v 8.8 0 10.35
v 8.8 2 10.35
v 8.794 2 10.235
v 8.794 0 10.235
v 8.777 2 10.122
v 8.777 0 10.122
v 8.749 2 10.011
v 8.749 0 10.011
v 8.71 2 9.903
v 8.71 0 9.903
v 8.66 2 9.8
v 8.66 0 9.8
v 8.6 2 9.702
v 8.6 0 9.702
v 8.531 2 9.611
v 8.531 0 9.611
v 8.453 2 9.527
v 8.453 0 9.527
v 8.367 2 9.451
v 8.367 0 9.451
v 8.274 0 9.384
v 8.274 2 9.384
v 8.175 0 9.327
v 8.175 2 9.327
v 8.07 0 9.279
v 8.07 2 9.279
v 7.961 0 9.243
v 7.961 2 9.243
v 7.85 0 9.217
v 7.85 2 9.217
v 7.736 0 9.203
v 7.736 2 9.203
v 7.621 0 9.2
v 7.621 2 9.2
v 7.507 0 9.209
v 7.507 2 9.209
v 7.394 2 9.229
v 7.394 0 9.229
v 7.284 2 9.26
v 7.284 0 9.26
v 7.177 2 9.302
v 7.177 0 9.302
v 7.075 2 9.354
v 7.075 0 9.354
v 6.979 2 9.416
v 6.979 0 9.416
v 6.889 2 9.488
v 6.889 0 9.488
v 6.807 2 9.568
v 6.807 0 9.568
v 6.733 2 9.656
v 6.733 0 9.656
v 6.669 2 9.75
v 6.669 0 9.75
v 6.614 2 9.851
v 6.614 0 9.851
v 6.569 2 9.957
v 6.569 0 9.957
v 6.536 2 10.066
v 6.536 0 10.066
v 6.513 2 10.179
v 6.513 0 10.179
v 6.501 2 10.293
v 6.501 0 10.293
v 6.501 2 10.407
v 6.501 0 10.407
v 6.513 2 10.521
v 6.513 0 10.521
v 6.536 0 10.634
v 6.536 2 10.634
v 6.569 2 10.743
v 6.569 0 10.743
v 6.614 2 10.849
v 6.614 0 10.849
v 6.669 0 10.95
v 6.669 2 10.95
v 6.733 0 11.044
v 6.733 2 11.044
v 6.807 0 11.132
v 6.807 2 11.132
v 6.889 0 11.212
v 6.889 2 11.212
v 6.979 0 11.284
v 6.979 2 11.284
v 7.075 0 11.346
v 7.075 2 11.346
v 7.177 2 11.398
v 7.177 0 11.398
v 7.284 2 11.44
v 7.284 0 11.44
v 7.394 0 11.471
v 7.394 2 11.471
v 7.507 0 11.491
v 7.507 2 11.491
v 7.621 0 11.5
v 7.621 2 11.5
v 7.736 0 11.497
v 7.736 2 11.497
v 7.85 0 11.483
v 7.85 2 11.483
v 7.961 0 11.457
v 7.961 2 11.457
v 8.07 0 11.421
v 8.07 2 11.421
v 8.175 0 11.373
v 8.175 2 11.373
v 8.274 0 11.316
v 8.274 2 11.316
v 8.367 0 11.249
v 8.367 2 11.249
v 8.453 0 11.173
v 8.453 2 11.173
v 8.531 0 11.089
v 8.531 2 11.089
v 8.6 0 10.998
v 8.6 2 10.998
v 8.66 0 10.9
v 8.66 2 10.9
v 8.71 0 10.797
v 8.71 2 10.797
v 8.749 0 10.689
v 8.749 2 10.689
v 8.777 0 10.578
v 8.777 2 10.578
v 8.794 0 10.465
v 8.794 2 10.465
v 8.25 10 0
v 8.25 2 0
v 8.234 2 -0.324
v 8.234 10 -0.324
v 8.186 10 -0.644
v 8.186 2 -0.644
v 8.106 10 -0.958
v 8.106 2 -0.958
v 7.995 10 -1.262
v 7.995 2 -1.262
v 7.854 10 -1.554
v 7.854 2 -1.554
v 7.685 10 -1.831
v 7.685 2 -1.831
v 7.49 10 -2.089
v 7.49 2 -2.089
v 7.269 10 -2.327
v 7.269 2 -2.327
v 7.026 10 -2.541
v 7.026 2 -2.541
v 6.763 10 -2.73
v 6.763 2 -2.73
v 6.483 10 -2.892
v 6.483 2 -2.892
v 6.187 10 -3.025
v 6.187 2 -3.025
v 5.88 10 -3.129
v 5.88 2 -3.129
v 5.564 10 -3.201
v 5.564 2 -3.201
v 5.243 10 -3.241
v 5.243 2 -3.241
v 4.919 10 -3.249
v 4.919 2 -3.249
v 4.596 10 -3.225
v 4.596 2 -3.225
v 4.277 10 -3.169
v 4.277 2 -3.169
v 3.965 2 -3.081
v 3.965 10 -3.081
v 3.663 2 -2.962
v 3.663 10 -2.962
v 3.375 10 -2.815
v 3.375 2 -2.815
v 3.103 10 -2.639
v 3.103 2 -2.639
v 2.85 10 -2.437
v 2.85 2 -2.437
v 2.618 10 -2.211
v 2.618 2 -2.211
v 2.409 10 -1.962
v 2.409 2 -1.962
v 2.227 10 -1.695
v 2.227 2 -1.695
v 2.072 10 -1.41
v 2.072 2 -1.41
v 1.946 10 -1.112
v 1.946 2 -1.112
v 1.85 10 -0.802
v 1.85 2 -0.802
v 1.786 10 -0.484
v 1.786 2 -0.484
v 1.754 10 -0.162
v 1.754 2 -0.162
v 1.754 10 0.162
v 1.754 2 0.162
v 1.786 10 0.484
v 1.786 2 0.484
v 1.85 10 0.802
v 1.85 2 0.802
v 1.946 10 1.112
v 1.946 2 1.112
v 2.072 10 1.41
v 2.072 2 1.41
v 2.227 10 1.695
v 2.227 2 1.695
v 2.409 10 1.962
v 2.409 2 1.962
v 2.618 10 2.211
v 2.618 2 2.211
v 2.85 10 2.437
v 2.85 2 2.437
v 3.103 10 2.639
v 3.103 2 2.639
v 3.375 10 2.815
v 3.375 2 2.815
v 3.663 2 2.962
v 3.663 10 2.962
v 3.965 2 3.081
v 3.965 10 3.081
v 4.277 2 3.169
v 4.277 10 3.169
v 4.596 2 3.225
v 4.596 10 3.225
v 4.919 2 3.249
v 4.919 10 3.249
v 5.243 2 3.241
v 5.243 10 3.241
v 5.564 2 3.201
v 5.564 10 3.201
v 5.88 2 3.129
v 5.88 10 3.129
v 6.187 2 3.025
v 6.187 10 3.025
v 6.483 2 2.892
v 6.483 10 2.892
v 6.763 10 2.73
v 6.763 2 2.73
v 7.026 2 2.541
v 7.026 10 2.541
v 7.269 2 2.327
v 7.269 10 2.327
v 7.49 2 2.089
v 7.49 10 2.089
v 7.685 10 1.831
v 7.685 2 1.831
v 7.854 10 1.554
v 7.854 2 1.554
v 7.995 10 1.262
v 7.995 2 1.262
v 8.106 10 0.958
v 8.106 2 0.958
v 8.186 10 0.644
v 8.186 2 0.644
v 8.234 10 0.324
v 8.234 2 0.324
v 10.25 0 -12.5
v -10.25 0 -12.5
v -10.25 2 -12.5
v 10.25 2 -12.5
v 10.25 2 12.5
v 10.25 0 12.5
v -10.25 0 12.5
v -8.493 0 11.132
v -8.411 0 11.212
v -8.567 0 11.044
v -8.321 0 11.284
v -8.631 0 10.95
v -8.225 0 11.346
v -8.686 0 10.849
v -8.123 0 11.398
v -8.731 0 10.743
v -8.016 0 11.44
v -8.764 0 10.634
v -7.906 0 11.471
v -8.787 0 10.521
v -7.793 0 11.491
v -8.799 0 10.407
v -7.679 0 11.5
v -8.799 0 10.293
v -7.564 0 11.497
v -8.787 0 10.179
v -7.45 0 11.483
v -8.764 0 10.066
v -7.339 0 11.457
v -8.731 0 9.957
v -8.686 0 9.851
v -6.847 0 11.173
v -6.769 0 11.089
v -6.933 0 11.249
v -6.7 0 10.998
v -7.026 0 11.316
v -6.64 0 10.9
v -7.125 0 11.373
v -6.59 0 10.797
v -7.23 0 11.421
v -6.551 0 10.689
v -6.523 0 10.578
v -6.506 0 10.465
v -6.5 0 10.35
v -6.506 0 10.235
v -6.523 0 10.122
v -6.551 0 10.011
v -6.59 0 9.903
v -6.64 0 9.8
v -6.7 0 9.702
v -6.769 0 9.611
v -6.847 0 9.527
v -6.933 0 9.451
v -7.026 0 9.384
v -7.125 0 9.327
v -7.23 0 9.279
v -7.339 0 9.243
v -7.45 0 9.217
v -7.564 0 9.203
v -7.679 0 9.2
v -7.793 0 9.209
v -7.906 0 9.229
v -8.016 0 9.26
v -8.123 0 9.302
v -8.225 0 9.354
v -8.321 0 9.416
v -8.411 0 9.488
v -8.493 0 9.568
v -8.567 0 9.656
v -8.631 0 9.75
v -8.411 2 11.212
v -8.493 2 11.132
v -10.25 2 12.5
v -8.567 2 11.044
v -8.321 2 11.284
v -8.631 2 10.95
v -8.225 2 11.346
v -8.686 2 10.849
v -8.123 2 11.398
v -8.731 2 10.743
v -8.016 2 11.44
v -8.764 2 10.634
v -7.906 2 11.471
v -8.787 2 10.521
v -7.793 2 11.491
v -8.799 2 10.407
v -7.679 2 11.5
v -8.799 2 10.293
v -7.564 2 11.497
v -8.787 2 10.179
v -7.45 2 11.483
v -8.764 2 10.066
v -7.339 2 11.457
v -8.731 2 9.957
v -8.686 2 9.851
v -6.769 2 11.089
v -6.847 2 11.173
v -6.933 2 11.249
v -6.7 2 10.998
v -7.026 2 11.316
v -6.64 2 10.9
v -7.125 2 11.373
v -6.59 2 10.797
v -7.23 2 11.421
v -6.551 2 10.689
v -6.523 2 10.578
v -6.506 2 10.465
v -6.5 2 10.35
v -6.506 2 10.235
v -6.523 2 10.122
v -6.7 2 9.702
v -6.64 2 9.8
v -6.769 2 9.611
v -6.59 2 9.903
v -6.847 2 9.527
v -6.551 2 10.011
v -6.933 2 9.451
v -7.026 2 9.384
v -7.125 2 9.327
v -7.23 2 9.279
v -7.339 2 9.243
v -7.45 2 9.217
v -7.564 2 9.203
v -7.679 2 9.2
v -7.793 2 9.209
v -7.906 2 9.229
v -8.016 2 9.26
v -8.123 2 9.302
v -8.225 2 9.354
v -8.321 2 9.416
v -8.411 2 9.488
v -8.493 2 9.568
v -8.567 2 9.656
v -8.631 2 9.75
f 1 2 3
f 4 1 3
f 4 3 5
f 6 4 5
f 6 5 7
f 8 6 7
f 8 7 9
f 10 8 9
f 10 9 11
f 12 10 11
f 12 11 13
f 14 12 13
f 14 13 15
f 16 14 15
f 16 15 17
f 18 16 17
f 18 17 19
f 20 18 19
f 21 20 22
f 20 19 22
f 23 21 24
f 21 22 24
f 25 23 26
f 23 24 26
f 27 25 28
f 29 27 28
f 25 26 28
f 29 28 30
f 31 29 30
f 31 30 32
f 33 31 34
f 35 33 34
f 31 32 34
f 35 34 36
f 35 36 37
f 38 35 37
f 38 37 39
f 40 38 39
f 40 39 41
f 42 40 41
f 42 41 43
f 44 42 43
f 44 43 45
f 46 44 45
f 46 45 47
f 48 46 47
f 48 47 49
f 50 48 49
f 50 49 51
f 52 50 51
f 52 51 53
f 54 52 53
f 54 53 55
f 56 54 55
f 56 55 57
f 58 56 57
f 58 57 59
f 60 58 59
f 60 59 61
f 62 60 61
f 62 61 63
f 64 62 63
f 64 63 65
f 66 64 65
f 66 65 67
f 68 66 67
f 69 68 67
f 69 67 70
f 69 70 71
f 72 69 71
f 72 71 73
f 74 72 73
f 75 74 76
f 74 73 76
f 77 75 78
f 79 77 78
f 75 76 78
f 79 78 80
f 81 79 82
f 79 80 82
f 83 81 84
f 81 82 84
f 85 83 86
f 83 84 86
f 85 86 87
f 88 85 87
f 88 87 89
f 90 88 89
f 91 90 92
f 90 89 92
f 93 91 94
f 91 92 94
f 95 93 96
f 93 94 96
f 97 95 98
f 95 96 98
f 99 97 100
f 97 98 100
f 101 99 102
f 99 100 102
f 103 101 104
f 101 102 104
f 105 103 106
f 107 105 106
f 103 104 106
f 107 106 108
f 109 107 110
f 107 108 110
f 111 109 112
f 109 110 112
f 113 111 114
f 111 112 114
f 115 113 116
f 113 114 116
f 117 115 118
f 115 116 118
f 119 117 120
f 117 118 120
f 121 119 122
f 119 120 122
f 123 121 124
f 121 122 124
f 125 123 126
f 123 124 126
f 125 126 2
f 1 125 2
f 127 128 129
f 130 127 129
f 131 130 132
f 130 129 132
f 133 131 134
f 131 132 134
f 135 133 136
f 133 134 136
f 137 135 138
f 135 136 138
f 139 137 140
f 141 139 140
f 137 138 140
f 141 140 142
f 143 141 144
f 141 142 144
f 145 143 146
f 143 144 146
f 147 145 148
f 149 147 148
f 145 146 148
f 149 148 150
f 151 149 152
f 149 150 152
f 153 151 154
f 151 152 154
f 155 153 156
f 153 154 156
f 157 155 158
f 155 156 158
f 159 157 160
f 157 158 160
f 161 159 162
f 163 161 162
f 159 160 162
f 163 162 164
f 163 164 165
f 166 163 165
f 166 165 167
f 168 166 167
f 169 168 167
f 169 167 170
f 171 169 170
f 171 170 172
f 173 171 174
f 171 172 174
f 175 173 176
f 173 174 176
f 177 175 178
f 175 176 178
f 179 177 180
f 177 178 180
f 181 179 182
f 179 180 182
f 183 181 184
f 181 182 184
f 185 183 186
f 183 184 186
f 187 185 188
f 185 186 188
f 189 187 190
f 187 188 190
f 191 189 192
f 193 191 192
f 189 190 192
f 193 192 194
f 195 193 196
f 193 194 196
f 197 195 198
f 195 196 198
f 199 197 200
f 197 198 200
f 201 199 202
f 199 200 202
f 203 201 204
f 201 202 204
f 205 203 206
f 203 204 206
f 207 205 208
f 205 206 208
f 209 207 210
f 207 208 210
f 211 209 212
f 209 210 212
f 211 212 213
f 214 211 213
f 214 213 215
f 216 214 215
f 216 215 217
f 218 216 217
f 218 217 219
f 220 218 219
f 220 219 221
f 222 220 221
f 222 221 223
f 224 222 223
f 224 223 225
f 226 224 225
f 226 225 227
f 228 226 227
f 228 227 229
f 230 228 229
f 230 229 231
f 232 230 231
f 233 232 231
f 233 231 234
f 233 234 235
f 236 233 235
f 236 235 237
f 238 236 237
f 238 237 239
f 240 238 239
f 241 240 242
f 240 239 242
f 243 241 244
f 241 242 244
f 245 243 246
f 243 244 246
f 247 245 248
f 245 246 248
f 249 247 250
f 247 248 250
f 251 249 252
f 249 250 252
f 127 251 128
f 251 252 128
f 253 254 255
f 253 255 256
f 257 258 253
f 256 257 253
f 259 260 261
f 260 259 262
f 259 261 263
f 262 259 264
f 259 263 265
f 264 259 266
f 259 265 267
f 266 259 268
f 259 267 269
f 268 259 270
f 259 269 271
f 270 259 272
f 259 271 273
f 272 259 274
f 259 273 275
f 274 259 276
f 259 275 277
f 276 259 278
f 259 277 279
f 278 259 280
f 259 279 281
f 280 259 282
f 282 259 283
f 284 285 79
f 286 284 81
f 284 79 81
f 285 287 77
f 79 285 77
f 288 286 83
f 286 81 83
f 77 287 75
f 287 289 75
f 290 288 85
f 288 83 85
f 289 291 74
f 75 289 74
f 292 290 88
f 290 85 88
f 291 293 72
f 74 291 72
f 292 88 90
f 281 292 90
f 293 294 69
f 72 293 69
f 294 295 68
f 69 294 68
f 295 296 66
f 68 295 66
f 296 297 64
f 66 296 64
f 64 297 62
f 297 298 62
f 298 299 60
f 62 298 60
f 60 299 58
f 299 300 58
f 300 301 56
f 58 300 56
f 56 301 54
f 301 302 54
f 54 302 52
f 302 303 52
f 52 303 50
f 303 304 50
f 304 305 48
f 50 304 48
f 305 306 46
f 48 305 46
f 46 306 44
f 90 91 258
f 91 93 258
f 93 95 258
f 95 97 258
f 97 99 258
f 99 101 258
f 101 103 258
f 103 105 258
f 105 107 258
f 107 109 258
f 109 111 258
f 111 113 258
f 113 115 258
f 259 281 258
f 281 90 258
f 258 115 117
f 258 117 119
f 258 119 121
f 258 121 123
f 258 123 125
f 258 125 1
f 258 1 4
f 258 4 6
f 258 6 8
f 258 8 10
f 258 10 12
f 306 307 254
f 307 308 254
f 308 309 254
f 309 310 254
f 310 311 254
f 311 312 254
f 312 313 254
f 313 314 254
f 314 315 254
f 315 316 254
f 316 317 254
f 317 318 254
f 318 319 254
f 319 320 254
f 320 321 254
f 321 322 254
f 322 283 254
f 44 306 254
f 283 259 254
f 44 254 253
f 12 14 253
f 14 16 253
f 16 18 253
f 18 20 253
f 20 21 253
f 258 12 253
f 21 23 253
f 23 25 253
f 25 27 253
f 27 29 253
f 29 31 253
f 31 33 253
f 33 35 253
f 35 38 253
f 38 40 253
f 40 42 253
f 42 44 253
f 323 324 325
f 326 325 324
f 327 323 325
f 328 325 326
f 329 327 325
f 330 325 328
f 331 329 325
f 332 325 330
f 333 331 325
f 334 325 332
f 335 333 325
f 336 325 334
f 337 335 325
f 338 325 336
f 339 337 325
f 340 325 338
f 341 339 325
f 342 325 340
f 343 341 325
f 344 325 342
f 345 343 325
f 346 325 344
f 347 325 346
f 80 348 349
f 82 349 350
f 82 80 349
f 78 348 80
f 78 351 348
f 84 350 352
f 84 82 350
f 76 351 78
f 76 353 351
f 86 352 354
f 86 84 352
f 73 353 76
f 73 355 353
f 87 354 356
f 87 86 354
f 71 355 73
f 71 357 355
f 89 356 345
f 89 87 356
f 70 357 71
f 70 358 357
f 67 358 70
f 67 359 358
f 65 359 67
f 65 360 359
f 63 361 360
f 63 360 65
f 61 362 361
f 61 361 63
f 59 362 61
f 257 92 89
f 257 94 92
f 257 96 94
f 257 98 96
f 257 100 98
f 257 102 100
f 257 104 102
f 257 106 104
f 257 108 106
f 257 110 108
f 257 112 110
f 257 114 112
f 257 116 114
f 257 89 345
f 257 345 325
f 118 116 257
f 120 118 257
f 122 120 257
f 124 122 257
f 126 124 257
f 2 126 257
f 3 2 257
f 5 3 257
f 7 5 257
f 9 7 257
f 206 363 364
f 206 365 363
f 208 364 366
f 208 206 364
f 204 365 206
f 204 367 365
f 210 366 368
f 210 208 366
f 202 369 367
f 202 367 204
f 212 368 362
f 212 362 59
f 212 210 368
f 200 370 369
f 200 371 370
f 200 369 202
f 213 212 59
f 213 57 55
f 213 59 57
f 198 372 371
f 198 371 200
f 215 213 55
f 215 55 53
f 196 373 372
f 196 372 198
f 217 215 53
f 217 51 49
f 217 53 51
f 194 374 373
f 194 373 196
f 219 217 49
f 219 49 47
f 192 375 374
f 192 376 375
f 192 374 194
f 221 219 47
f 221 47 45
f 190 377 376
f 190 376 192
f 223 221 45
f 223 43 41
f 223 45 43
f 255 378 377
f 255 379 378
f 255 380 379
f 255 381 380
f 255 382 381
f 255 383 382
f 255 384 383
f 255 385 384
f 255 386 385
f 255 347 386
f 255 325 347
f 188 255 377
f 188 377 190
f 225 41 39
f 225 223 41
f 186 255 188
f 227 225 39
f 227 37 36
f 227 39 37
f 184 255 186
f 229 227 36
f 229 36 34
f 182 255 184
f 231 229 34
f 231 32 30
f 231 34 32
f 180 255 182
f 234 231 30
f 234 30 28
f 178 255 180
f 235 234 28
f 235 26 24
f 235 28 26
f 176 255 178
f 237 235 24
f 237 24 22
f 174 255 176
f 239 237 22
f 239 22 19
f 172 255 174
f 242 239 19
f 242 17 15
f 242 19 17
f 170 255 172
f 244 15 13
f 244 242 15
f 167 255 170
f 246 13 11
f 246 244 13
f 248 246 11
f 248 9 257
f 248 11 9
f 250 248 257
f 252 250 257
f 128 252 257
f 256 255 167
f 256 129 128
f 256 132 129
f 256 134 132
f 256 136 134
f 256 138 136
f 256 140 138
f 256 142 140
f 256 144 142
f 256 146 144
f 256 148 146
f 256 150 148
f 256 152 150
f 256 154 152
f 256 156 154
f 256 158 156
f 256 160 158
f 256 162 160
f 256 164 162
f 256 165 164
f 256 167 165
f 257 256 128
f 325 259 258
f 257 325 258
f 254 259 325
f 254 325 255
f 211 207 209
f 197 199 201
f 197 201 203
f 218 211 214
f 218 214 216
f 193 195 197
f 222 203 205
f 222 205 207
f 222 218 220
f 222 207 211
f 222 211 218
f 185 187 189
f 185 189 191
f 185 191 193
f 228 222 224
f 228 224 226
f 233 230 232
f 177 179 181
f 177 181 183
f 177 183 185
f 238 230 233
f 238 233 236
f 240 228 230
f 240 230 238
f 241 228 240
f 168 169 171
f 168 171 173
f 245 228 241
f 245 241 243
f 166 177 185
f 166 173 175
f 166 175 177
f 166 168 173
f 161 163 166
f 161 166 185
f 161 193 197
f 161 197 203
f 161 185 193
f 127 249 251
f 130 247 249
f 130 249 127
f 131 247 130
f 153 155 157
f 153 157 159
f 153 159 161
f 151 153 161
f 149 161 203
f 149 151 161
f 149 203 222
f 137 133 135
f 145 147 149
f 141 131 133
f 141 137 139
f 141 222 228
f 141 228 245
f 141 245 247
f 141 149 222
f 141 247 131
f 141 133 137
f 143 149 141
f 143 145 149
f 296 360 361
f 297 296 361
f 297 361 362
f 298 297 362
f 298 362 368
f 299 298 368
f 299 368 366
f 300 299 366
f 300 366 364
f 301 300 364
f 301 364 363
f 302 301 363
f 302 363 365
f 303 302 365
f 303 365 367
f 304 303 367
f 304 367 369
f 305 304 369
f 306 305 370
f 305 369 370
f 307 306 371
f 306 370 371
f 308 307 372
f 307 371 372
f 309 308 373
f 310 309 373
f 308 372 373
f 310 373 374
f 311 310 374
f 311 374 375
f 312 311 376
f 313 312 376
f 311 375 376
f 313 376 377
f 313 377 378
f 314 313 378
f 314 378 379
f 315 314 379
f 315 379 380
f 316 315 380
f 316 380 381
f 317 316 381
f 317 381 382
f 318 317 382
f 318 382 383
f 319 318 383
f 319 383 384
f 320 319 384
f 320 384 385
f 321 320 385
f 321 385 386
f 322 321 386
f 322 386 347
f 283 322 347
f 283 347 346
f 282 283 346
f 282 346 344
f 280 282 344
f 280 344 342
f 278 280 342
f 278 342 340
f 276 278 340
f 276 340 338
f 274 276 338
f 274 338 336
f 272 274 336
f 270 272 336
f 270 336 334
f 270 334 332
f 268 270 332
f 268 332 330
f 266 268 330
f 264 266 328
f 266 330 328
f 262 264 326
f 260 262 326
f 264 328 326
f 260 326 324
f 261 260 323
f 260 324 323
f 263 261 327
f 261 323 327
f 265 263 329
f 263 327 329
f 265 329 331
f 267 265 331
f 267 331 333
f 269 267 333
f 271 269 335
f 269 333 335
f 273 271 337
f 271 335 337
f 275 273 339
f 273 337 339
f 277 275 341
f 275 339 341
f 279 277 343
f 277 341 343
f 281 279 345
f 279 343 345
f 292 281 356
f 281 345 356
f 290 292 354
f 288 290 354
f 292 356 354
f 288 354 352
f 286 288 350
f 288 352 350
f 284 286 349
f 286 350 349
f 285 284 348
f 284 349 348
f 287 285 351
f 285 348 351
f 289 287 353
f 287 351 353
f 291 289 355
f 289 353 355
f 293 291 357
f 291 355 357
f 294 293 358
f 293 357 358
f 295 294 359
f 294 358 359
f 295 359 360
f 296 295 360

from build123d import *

# Parameters (mm, degrees)
SKETCH1_W           = 20.5
SKETCH1_H           = 25
BOSS_EXTRUDE1_DEPTH = 2
SKETCH2_R           = 1.15
CUT_EXTRUDE1_DEPTH  = 3
SKETCH3_R           = 3.25
BOSS_EXTRUDE2_DEPTH = 8


with BuildPart() as part:
    # Sketch1 → Boss-Extrude1 (new body)
    with BuildSketch(Plane(origin=(0, 0, 0), x_dir=(1, 0, 0), z_dir=(0, 1, 0))):
        Rectangle(SKETCH1_W, SKETCH1_H)
    extrude(amount=BOSS_EXTRUDE1_DEPTH)

    # Sketch2 → Cut-Extrude1 (cut, through all)
    with BuildSketch(Plane(origin=(0, 2, 0), x_dir=(1, 0, 0), z_dir=(0, 1, 0))):
        with Locations((7.65, -10.35)):
            Circle(SKETCH2_R)
        with Locations((-7.65, -10.35)):
            Circle(SKETCH2_R)
    extrude(amount=-CUT_EXTRUDE1_DEPTH, mode=Mode.SUBTRACT)

    # Sketch3 → Boss-Extrude2 (add)
    with BuildSketch(Plane(origin=(0, 2, 0), x_dir=(1, 0, 0), z_dir=(0, 1, 0))):
        with Locations((5, 0)):
            Circle(SKETCH3_R)
    extrude(amount=BOSS_EXTRUDE2_DEPTH)


solid = part.part
